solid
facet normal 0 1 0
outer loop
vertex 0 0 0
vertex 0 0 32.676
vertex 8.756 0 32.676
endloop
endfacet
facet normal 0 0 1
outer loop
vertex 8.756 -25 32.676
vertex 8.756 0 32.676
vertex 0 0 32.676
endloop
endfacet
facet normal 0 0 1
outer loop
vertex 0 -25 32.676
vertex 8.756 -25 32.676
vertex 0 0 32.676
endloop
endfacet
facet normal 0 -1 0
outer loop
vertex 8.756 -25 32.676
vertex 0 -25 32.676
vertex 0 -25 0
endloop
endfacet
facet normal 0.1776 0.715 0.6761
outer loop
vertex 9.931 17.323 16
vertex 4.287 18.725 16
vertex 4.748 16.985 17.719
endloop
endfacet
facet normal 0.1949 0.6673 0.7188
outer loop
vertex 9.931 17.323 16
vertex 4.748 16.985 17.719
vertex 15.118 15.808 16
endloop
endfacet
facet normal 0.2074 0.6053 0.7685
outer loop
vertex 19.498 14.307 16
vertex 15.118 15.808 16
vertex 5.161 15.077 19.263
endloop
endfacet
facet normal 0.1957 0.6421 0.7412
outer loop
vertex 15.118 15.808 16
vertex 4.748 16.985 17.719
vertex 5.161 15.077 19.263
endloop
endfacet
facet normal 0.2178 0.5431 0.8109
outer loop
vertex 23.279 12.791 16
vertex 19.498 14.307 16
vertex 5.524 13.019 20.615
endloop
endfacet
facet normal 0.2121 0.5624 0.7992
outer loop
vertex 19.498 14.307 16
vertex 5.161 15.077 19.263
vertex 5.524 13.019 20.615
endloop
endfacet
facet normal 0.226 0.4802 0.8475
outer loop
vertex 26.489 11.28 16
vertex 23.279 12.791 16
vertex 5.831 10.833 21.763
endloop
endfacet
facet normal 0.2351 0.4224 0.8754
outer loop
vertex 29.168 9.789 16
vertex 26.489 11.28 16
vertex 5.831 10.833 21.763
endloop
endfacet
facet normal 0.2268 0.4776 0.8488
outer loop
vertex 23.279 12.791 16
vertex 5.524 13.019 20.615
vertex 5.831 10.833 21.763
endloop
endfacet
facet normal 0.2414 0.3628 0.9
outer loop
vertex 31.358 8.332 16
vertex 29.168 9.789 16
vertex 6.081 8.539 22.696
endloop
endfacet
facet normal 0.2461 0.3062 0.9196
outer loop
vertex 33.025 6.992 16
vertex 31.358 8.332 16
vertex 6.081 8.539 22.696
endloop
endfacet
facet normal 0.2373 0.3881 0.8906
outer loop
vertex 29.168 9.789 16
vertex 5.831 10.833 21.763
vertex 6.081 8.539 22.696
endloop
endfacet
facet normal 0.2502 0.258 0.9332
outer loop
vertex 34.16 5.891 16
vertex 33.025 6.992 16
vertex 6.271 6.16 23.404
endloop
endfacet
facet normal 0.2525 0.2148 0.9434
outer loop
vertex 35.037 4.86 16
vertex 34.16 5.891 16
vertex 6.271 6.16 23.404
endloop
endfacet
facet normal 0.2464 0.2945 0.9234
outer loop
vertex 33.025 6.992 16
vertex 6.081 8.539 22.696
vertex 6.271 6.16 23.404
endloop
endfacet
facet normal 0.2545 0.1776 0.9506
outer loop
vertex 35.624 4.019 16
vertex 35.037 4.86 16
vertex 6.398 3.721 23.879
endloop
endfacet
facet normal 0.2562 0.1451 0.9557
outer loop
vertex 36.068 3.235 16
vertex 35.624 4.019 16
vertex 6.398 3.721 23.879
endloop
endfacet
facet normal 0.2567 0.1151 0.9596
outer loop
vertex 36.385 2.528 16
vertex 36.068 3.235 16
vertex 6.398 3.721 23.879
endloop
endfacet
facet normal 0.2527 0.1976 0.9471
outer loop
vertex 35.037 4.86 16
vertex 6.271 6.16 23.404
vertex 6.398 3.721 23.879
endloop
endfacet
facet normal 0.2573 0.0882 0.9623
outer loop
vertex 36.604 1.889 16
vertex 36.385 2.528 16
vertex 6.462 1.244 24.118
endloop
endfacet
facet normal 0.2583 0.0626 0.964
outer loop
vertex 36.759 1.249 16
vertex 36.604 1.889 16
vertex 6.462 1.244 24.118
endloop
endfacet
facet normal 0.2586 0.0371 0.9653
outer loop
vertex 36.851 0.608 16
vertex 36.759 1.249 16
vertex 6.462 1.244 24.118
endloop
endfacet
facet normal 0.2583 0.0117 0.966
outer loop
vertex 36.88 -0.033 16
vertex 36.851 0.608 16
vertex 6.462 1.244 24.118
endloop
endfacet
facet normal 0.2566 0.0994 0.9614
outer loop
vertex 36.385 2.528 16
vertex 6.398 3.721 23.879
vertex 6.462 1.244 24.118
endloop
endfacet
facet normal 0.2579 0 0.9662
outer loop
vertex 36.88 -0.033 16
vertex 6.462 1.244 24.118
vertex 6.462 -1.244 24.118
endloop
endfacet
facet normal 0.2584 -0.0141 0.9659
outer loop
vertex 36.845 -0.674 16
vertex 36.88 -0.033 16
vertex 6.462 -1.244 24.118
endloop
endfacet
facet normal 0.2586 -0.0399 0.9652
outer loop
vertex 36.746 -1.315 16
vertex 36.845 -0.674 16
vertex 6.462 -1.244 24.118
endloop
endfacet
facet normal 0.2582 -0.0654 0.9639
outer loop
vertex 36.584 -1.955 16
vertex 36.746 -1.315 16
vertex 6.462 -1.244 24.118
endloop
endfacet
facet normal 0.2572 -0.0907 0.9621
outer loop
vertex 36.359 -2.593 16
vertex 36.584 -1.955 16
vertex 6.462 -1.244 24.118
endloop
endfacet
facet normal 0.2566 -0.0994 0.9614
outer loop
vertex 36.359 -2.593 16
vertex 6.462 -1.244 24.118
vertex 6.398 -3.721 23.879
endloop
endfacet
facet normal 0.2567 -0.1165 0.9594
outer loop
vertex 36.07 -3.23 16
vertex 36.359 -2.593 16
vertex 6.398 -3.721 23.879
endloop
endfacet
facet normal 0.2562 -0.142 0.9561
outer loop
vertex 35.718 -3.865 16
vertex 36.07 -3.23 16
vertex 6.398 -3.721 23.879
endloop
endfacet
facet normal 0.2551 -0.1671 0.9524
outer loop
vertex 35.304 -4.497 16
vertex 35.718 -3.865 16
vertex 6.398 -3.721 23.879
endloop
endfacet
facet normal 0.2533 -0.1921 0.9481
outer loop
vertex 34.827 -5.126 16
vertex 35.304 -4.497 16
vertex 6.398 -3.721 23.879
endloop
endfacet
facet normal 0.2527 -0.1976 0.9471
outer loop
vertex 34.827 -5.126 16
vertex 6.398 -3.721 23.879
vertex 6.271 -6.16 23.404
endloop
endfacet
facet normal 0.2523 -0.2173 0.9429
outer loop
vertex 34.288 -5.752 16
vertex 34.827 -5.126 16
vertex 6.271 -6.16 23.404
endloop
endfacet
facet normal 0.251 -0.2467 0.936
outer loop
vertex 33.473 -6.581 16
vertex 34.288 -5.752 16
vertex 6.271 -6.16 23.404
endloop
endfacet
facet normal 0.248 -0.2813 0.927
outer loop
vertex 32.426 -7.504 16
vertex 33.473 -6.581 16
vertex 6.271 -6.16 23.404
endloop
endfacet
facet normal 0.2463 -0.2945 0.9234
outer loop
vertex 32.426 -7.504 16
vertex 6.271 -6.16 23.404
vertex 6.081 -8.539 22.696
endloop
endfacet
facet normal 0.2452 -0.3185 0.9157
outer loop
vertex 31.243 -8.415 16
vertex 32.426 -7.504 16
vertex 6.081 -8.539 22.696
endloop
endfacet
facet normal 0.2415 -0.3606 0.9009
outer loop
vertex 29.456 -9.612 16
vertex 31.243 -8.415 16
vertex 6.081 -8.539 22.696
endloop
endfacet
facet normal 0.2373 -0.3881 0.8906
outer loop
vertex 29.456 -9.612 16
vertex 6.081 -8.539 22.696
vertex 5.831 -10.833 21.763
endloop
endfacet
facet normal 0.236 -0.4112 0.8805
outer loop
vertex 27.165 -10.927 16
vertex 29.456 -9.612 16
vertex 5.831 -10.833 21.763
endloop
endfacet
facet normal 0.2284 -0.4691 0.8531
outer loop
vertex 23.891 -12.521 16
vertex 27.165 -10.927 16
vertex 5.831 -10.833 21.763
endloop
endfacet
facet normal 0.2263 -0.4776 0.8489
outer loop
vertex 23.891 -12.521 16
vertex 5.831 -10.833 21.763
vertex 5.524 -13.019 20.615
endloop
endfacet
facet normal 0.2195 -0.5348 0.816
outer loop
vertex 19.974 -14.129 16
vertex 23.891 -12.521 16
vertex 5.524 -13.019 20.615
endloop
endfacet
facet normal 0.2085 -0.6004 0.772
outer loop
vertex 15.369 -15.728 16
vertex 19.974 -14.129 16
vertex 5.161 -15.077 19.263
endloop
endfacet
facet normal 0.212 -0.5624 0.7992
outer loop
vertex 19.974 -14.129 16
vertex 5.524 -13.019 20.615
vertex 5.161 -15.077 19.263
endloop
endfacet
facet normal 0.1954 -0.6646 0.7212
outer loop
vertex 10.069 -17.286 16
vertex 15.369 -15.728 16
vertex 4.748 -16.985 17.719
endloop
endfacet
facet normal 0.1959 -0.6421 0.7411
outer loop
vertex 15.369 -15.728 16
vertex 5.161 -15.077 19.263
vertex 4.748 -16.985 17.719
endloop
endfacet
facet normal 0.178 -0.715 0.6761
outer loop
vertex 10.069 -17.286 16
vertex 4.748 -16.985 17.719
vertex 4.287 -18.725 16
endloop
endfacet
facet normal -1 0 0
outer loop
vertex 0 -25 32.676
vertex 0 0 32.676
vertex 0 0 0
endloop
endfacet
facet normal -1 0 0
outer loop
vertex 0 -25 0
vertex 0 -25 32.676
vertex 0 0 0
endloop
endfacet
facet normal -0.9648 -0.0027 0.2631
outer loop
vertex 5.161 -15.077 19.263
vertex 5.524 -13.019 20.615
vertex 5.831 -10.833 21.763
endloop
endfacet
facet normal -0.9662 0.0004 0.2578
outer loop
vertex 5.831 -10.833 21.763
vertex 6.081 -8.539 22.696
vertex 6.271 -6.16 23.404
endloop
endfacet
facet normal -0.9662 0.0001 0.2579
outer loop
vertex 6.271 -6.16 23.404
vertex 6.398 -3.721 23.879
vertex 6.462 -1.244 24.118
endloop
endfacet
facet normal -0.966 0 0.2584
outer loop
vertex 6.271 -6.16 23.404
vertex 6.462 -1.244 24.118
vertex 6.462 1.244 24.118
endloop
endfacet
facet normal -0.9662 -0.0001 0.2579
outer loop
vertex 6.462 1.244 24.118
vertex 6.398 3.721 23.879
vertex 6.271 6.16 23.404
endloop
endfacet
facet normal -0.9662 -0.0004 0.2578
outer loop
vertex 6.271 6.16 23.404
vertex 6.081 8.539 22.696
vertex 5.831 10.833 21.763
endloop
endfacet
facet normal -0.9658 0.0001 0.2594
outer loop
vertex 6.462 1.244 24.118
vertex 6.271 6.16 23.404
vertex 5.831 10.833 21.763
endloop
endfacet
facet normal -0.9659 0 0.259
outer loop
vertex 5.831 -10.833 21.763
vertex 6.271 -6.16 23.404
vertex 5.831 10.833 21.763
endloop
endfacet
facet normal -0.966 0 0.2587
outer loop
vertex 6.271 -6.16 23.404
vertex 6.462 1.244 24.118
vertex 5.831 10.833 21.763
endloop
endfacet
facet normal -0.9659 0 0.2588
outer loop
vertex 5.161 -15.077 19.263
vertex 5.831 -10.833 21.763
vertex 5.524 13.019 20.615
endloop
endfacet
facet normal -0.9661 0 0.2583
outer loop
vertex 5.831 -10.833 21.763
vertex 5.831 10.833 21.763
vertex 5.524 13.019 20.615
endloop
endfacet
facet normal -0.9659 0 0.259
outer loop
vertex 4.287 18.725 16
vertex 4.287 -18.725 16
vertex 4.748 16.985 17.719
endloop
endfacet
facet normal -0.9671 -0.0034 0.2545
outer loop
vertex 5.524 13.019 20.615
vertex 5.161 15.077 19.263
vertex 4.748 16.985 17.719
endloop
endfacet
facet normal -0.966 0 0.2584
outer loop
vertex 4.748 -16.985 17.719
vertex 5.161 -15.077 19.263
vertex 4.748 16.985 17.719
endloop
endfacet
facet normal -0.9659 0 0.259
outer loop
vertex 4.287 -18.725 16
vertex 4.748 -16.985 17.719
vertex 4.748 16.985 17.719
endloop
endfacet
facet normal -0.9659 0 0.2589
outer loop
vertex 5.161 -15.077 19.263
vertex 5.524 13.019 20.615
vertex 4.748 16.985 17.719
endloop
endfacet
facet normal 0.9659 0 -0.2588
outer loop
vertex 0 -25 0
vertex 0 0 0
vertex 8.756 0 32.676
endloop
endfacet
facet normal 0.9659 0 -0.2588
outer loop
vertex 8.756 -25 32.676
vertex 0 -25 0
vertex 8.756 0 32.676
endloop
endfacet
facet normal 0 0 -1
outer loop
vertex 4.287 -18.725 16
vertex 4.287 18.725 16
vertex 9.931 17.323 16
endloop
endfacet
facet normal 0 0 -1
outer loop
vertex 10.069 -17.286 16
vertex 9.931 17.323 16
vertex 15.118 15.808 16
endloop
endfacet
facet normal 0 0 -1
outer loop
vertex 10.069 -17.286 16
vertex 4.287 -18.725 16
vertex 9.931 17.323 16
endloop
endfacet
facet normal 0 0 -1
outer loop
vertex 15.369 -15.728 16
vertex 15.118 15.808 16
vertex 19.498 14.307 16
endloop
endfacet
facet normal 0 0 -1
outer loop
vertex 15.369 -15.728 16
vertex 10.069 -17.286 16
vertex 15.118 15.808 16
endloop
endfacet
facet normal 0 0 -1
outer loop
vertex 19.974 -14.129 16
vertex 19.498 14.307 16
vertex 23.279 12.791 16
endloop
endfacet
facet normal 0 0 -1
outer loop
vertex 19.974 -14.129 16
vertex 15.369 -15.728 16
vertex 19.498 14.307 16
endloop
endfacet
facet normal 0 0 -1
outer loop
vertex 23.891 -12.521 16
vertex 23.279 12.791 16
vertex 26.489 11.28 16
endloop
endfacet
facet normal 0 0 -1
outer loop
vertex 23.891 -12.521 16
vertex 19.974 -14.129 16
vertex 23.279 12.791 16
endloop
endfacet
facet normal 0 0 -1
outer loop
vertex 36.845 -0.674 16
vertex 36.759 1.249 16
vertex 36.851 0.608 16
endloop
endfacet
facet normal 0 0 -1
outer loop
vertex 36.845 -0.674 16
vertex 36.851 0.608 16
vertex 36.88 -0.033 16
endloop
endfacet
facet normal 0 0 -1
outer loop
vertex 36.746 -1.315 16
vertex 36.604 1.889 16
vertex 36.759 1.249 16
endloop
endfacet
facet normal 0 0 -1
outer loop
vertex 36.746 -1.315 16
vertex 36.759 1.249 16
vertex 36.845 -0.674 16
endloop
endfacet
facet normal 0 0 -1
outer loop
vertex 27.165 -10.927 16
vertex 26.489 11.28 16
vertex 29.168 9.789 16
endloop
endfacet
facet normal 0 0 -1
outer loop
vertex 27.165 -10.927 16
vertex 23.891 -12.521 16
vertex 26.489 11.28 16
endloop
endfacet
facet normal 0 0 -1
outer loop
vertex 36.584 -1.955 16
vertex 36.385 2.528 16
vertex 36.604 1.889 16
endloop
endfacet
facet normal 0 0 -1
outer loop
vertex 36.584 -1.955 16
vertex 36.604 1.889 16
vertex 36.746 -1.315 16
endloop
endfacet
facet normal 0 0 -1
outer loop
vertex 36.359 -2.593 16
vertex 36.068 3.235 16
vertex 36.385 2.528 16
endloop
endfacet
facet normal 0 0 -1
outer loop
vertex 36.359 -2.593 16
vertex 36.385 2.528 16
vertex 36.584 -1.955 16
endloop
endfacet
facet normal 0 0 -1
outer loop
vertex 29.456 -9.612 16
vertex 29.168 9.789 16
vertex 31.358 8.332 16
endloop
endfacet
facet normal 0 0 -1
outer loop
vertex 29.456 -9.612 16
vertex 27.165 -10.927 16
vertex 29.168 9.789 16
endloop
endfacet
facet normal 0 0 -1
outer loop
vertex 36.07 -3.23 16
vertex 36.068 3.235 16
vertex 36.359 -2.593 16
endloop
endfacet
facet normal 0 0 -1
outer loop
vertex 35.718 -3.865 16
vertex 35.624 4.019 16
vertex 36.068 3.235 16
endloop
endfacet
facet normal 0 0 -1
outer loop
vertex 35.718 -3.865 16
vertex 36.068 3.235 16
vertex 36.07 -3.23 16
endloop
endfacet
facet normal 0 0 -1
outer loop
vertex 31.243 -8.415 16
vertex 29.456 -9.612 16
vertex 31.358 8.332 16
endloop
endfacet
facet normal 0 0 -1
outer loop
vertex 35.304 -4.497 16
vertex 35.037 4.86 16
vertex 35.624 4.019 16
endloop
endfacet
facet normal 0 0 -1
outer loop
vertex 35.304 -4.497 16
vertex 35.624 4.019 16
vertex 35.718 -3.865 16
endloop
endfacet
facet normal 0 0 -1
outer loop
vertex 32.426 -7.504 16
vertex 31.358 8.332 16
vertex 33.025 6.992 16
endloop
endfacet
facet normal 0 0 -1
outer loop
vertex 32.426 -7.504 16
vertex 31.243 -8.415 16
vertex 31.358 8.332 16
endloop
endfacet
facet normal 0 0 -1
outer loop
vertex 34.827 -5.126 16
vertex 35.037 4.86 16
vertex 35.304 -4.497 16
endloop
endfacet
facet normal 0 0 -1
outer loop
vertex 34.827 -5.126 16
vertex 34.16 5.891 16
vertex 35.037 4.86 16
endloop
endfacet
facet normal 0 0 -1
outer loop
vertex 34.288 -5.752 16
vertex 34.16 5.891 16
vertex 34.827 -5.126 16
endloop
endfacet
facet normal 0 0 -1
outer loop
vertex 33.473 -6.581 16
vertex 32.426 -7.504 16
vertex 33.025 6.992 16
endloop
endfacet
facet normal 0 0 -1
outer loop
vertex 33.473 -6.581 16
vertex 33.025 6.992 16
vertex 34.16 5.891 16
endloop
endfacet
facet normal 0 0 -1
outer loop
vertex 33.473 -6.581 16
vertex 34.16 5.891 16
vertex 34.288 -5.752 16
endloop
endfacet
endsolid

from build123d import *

# Parameters (mm, degrees)
F1_DEPTH = 25
F3_R     = 25
F4_DEPTH = 50
F5_W     = 90
F5_H     = 90
F6_DEPTH = 37.5


with BuildPart() as f1:
    # F0 (on Front) → F1 (new body)
    with BuildSketch(Plane.XZ):
        Polygon((0, 32.6764256879), (0, 0), (8.7556218746, 32.6764256879), align=None)
    extrude(amount=F1_DEPTH)


with BuildPart() as f4:
    # F3 (on offset) → F4 (new body)
    with BuildSketch(Plane(origin=(0, 0, 0), x_dir=(0, 1, 0), z_dir=(0.9659258263, 0, -0.2588190451))):
        Circle(F3_R)
    extrude(amount=F4_DEPTH)


with BuildPart() as f6:
    # F5 (on Front) → F6 (new body, symmetric)
    with BuildSketch(Plane.XZ):
        with Locations((20, -29)):
            Rectangle(F5_W, F5_H)
    extrude(amount=F6_DEPTH, both=True)


with BuildPart() as f4_1:
    add(f4.part)

    # F7: cut F6
    add(f6.part, mode=Mode.SUBTRACT)


solid = Compound([f1.part, f4_1.part])
